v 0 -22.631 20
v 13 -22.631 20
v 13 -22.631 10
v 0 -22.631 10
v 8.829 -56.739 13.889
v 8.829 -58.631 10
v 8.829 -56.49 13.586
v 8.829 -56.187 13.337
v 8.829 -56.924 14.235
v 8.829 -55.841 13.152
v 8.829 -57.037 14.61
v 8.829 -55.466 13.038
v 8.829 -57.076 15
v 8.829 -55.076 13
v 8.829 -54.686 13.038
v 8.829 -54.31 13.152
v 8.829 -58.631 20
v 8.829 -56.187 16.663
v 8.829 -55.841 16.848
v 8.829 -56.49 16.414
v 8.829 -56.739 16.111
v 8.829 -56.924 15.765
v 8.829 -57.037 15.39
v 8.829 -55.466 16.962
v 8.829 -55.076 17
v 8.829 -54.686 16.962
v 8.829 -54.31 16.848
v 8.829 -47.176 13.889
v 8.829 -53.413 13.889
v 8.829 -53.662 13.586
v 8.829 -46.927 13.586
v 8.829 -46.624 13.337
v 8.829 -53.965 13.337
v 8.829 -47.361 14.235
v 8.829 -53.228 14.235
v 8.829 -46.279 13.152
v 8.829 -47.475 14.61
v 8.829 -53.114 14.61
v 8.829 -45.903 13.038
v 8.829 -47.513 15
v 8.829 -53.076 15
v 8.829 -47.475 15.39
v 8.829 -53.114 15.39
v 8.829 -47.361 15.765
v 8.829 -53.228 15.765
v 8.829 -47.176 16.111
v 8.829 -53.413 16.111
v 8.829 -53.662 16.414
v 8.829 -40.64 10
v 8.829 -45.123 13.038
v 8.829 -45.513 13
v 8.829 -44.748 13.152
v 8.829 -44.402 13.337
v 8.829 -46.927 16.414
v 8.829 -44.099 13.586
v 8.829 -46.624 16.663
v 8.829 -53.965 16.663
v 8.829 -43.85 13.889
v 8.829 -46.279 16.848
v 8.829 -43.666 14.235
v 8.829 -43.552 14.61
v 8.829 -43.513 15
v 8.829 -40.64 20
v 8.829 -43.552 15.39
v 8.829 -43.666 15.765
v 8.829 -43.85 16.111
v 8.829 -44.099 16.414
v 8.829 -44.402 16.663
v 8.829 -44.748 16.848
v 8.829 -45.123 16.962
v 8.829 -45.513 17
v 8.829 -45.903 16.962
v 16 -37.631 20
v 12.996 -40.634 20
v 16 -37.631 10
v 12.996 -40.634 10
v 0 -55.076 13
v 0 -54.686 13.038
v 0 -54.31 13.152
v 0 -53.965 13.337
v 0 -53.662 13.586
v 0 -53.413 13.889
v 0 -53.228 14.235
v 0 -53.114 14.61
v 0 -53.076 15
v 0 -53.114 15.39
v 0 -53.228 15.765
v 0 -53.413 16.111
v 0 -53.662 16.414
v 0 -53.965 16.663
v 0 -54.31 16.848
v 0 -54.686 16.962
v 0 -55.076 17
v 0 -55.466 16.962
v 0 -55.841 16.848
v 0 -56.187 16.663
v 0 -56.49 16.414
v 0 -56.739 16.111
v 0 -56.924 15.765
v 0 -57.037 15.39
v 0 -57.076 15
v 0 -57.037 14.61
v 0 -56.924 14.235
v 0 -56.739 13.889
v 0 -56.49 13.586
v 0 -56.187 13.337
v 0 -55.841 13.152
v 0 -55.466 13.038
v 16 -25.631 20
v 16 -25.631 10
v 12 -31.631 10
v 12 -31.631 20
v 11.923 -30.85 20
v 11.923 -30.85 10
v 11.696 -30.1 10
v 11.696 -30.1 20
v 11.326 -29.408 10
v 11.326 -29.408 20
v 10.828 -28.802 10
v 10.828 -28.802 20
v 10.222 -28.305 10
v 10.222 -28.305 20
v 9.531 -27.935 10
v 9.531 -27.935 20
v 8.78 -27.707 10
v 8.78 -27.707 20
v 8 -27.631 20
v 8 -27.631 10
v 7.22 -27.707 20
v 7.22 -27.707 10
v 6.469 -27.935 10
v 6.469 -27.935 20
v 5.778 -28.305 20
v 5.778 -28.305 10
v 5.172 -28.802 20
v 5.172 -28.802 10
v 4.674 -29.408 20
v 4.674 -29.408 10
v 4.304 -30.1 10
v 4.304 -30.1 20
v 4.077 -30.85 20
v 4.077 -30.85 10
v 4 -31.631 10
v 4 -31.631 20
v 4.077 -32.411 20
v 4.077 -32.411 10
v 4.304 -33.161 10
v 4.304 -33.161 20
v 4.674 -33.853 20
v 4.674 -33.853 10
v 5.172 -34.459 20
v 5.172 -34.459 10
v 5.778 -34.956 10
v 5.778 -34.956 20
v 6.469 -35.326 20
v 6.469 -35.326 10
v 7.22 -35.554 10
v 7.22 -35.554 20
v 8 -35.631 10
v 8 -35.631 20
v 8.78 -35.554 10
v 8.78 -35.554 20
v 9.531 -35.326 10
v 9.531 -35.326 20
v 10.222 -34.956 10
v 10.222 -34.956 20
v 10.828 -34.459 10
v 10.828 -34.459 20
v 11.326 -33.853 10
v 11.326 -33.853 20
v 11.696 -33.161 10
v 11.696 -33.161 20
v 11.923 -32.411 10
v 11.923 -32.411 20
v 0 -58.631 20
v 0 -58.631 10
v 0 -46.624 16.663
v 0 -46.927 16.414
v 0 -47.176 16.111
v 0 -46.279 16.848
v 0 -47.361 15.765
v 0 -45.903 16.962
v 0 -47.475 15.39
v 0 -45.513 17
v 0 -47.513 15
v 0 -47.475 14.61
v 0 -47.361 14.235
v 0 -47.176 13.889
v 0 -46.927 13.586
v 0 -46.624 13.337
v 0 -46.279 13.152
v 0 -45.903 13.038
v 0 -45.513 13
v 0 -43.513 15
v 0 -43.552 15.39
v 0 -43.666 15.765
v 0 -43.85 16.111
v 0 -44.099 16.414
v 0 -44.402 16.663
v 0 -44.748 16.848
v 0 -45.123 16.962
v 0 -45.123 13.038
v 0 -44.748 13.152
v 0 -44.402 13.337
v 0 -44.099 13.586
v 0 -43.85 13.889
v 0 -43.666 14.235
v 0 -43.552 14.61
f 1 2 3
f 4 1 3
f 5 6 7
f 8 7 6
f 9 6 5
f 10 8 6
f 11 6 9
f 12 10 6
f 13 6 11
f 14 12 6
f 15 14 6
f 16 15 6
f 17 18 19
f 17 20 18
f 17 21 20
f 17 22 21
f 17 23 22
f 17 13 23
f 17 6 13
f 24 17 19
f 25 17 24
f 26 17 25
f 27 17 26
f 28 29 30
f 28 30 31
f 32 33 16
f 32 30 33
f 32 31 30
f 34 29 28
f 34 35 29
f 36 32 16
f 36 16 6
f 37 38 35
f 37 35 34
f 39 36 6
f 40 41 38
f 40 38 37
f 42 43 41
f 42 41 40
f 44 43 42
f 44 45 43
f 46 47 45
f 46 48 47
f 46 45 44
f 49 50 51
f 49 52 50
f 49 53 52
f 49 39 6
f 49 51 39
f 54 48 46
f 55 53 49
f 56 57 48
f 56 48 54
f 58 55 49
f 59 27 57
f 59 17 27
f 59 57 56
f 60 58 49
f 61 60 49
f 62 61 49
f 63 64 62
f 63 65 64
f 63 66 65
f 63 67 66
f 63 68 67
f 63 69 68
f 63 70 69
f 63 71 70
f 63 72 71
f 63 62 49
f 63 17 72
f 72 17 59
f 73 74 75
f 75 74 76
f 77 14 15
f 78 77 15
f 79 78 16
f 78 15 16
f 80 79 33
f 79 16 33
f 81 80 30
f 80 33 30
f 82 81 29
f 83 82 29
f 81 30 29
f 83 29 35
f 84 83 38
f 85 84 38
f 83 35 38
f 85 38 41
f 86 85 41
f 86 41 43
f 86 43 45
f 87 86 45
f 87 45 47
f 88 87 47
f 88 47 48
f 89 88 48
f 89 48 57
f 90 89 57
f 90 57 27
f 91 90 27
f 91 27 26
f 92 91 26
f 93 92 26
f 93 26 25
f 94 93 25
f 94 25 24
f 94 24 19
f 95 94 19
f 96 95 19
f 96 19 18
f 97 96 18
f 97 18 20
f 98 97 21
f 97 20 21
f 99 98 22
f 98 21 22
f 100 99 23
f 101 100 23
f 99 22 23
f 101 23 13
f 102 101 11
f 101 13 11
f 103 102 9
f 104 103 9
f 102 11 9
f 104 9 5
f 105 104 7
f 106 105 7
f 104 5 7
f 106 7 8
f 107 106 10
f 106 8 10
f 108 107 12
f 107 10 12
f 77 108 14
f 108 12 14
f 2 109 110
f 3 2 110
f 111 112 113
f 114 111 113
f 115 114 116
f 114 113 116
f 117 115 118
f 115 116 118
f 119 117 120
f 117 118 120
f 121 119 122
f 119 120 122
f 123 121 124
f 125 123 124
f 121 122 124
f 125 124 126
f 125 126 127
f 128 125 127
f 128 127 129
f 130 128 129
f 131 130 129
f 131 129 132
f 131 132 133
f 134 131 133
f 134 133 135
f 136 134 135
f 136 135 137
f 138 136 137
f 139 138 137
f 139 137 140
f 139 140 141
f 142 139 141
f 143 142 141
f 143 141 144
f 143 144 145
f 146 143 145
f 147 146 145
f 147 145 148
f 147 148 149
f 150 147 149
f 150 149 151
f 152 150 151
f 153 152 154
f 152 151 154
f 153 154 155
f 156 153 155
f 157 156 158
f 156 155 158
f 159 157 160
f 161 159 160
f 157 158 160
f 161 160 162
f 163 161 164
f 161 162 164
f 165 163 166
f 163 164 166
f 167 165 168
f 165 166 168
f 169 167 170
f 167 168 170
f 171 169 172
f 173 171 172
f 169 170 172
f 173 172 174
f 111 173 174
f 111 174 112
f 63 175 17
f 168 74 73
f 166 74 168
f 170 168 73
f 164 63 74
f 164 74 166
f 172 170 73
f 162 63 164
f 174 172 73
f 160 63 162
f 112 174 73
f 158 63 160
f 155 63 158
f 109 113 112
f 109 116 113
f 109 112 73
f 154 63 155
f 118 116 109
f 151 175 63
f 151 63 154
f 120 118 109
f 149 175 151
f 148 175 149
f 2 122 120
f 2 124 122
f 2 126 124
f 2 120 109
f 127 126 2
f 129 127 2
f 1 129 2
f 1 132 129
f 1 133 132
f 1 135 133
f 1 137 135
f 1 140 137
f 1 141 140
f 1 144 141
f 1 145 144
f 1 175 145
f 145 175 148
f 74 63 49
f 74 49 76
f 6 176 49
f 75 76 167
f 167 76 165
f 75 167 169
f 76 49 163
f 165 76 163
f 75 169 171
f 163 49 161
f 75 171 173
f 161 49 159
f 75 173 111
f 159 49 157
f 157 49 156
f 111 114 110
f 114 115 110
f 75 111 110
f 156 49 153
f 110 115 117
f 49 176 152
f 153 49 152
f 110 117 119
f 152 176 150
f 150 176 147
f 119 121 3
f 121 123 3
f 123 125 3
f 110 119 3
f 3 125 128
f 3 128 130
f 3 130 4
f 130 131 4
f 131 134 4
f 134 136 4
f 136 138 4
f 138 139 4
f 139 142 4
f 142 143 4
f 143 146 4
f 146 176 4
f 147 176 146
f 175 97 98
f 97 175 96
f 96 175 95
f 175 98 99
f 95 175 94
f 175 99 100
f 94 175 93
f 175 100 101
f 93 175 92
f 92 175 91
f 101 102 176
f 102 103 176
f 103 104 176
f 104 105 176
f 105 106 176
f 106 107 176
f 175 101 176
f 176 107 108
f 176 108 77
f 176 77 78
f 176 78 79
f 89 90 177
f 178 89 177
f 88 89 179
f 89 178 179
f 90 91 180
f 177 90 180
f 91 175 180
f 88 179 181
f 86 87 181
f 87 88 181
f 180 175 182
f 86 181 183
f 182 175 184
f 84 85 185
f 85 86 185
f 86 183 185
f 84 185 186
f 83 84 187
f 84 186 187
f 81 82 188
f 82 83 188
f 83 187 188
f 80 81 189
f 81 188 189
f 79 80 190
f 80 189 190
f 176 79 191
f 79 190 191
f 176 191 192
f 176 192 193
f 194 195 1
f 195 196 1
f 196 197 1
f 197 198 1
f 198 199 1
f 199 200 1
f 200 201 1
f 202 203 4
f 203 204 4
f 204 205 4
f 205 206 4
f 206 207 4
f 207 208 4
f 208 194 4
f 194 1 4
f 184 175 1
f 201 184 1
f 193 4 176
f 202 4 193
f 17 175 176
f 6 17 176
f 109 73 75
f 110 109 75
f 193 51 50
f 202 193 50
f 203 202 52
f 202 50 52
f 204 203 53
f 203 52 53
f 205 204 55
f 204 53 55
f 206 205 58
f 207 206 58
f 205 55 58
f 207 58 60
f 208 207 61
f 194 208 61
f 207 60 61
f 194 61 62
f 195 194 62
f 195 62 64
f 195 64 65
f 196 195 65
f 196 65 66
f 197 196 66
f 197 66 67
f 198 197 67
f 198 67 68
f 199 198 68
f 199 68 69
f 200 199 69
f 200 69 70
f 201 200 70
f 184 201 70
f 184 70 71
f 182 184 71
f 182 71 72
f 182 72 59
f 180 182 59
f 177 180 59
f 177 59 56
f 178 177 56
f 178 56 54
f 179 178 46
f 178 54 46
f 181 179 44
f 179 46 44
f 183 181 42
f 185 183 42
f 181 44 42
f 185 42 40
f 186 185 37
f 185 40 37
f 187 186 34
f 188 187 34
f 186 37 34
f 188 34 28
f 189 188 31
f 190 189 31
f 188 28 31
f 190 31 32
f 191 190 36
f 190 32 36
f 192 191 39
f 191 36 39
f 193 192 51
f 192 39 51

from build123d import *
from OCP.BRepFilletAPI import BRepFilletAPI_MakeChamfer

# Parameters (mm, degrees)
SKETCH_1_W            = 10
SKETCH_1_H            = 36
EXTRUDE_1_DEPTH       = 16
SKETCH_5_R            = 4.000000001
CUT_EXTRUDE_2_DEPTH   = 62.591736841
CUT_EXTRUDE_3_DEPTH   = 62.591736841
CHAMFER_1_SIZE        = 3
CHAMFER_1_SIZE2       = 3.003831905
SKETCH_7_R            = 2
CUT_EXTRUDE_2_2_DEPTH = 63.573848038


with BuildPart() as part:
    # Эскиз1 → Вытянуть1 (new body)
    with BuildSketch(Plane(origin=(0, 0, 0), x_dir=(0, 0, -1), z_dir=(1, 0, 0))):
        with Locations((-15, -40.630555576)):
            Rectangle(SKETCH_1_W, SKETCH_1_H)
    extrude(amount=EXTRUDE_1_DEPTH)

    # Эскиз5 → Cut-Extrude 2 (cut, through all)
    with BuildSketch(Plane.XY.offset(20)):
        with Locations((8, -31.630555576)):
            Circle(SKETCH_5_R)
    extrude(amount=-CUT_EXTRUDE_2_DEPTH, mode=Mode.SUBTRACT)

    # Эскиз6 → Вырез-Вытянуть3 (cut, through all)
    with BuildSketch(Plane.XY.offset(20)):
        Polygon((16, -40.630555576), (16, -58.630555576), (8.828613207, -58.630555576), (8.828613207, -40.639698094), align=None)
    extrude(amount=-CUT_EXTRUDE_3_DEPTH, mode=Mode.SUBTRACT)

    # Фаска1: one chamfer whose edges measure the first distance from different faces: ONE call of the kernel's chamfer builder (chamfer() names one face for all edges)
    chamfer_1_edges_1 = [part.edges().sort_by_distance(p)[0] for p in [
        (16, -40.630555576, 15),
    ]]
    chamfer_1_side_1 = [part.faces().sort_by_distance(p)[0] for p in [
        (16, -31.630555576, 15),
    ]]
    chamfer_1_edges_2 = [part.edges().sort_by_distance(p)[0] for p in [
        (16, -22.630555576, 15),
    ]]
    chamfer_1 = BRepFilletAPI_MakeChamfer(part.part.solid().wrapped)
    for e in chamfer_1_edges_1:
        chamfer_1.Add(CHAMFER_1_SIZE, CHAMFER_1_SIZE2, e.wrapped, chamfer_1_side_1[0].wrapped)  # the first distance lies on this face
    for e in chamfer_1_edges_2:
        chamfer_1.Add(CHAMFER_1_SIZE, e.wrapped)
    add(Compound.cast(chamfer_1.Shape()), mode=Mode.REPLACE)

    # Эскиз7 → Cut-Extrude 2 2 (cut, through all)
    with BuildSketch(Plane(origin=(8.828613207, 0, 0), x_dir=(0, 0, -1), z_dir=(1, 0, 0))):
        with Locations((-15, -55.075818026)):
            Circle(SKETCH_7_R)
        with Locations((-15, -45.513282345)):
            Circle(SKETCH_7_R)
    extrude(amount=-CUT_EXTRUDE_2_2_DEPTH, mode=Mode.SUBTRACT)


solid = part.part
